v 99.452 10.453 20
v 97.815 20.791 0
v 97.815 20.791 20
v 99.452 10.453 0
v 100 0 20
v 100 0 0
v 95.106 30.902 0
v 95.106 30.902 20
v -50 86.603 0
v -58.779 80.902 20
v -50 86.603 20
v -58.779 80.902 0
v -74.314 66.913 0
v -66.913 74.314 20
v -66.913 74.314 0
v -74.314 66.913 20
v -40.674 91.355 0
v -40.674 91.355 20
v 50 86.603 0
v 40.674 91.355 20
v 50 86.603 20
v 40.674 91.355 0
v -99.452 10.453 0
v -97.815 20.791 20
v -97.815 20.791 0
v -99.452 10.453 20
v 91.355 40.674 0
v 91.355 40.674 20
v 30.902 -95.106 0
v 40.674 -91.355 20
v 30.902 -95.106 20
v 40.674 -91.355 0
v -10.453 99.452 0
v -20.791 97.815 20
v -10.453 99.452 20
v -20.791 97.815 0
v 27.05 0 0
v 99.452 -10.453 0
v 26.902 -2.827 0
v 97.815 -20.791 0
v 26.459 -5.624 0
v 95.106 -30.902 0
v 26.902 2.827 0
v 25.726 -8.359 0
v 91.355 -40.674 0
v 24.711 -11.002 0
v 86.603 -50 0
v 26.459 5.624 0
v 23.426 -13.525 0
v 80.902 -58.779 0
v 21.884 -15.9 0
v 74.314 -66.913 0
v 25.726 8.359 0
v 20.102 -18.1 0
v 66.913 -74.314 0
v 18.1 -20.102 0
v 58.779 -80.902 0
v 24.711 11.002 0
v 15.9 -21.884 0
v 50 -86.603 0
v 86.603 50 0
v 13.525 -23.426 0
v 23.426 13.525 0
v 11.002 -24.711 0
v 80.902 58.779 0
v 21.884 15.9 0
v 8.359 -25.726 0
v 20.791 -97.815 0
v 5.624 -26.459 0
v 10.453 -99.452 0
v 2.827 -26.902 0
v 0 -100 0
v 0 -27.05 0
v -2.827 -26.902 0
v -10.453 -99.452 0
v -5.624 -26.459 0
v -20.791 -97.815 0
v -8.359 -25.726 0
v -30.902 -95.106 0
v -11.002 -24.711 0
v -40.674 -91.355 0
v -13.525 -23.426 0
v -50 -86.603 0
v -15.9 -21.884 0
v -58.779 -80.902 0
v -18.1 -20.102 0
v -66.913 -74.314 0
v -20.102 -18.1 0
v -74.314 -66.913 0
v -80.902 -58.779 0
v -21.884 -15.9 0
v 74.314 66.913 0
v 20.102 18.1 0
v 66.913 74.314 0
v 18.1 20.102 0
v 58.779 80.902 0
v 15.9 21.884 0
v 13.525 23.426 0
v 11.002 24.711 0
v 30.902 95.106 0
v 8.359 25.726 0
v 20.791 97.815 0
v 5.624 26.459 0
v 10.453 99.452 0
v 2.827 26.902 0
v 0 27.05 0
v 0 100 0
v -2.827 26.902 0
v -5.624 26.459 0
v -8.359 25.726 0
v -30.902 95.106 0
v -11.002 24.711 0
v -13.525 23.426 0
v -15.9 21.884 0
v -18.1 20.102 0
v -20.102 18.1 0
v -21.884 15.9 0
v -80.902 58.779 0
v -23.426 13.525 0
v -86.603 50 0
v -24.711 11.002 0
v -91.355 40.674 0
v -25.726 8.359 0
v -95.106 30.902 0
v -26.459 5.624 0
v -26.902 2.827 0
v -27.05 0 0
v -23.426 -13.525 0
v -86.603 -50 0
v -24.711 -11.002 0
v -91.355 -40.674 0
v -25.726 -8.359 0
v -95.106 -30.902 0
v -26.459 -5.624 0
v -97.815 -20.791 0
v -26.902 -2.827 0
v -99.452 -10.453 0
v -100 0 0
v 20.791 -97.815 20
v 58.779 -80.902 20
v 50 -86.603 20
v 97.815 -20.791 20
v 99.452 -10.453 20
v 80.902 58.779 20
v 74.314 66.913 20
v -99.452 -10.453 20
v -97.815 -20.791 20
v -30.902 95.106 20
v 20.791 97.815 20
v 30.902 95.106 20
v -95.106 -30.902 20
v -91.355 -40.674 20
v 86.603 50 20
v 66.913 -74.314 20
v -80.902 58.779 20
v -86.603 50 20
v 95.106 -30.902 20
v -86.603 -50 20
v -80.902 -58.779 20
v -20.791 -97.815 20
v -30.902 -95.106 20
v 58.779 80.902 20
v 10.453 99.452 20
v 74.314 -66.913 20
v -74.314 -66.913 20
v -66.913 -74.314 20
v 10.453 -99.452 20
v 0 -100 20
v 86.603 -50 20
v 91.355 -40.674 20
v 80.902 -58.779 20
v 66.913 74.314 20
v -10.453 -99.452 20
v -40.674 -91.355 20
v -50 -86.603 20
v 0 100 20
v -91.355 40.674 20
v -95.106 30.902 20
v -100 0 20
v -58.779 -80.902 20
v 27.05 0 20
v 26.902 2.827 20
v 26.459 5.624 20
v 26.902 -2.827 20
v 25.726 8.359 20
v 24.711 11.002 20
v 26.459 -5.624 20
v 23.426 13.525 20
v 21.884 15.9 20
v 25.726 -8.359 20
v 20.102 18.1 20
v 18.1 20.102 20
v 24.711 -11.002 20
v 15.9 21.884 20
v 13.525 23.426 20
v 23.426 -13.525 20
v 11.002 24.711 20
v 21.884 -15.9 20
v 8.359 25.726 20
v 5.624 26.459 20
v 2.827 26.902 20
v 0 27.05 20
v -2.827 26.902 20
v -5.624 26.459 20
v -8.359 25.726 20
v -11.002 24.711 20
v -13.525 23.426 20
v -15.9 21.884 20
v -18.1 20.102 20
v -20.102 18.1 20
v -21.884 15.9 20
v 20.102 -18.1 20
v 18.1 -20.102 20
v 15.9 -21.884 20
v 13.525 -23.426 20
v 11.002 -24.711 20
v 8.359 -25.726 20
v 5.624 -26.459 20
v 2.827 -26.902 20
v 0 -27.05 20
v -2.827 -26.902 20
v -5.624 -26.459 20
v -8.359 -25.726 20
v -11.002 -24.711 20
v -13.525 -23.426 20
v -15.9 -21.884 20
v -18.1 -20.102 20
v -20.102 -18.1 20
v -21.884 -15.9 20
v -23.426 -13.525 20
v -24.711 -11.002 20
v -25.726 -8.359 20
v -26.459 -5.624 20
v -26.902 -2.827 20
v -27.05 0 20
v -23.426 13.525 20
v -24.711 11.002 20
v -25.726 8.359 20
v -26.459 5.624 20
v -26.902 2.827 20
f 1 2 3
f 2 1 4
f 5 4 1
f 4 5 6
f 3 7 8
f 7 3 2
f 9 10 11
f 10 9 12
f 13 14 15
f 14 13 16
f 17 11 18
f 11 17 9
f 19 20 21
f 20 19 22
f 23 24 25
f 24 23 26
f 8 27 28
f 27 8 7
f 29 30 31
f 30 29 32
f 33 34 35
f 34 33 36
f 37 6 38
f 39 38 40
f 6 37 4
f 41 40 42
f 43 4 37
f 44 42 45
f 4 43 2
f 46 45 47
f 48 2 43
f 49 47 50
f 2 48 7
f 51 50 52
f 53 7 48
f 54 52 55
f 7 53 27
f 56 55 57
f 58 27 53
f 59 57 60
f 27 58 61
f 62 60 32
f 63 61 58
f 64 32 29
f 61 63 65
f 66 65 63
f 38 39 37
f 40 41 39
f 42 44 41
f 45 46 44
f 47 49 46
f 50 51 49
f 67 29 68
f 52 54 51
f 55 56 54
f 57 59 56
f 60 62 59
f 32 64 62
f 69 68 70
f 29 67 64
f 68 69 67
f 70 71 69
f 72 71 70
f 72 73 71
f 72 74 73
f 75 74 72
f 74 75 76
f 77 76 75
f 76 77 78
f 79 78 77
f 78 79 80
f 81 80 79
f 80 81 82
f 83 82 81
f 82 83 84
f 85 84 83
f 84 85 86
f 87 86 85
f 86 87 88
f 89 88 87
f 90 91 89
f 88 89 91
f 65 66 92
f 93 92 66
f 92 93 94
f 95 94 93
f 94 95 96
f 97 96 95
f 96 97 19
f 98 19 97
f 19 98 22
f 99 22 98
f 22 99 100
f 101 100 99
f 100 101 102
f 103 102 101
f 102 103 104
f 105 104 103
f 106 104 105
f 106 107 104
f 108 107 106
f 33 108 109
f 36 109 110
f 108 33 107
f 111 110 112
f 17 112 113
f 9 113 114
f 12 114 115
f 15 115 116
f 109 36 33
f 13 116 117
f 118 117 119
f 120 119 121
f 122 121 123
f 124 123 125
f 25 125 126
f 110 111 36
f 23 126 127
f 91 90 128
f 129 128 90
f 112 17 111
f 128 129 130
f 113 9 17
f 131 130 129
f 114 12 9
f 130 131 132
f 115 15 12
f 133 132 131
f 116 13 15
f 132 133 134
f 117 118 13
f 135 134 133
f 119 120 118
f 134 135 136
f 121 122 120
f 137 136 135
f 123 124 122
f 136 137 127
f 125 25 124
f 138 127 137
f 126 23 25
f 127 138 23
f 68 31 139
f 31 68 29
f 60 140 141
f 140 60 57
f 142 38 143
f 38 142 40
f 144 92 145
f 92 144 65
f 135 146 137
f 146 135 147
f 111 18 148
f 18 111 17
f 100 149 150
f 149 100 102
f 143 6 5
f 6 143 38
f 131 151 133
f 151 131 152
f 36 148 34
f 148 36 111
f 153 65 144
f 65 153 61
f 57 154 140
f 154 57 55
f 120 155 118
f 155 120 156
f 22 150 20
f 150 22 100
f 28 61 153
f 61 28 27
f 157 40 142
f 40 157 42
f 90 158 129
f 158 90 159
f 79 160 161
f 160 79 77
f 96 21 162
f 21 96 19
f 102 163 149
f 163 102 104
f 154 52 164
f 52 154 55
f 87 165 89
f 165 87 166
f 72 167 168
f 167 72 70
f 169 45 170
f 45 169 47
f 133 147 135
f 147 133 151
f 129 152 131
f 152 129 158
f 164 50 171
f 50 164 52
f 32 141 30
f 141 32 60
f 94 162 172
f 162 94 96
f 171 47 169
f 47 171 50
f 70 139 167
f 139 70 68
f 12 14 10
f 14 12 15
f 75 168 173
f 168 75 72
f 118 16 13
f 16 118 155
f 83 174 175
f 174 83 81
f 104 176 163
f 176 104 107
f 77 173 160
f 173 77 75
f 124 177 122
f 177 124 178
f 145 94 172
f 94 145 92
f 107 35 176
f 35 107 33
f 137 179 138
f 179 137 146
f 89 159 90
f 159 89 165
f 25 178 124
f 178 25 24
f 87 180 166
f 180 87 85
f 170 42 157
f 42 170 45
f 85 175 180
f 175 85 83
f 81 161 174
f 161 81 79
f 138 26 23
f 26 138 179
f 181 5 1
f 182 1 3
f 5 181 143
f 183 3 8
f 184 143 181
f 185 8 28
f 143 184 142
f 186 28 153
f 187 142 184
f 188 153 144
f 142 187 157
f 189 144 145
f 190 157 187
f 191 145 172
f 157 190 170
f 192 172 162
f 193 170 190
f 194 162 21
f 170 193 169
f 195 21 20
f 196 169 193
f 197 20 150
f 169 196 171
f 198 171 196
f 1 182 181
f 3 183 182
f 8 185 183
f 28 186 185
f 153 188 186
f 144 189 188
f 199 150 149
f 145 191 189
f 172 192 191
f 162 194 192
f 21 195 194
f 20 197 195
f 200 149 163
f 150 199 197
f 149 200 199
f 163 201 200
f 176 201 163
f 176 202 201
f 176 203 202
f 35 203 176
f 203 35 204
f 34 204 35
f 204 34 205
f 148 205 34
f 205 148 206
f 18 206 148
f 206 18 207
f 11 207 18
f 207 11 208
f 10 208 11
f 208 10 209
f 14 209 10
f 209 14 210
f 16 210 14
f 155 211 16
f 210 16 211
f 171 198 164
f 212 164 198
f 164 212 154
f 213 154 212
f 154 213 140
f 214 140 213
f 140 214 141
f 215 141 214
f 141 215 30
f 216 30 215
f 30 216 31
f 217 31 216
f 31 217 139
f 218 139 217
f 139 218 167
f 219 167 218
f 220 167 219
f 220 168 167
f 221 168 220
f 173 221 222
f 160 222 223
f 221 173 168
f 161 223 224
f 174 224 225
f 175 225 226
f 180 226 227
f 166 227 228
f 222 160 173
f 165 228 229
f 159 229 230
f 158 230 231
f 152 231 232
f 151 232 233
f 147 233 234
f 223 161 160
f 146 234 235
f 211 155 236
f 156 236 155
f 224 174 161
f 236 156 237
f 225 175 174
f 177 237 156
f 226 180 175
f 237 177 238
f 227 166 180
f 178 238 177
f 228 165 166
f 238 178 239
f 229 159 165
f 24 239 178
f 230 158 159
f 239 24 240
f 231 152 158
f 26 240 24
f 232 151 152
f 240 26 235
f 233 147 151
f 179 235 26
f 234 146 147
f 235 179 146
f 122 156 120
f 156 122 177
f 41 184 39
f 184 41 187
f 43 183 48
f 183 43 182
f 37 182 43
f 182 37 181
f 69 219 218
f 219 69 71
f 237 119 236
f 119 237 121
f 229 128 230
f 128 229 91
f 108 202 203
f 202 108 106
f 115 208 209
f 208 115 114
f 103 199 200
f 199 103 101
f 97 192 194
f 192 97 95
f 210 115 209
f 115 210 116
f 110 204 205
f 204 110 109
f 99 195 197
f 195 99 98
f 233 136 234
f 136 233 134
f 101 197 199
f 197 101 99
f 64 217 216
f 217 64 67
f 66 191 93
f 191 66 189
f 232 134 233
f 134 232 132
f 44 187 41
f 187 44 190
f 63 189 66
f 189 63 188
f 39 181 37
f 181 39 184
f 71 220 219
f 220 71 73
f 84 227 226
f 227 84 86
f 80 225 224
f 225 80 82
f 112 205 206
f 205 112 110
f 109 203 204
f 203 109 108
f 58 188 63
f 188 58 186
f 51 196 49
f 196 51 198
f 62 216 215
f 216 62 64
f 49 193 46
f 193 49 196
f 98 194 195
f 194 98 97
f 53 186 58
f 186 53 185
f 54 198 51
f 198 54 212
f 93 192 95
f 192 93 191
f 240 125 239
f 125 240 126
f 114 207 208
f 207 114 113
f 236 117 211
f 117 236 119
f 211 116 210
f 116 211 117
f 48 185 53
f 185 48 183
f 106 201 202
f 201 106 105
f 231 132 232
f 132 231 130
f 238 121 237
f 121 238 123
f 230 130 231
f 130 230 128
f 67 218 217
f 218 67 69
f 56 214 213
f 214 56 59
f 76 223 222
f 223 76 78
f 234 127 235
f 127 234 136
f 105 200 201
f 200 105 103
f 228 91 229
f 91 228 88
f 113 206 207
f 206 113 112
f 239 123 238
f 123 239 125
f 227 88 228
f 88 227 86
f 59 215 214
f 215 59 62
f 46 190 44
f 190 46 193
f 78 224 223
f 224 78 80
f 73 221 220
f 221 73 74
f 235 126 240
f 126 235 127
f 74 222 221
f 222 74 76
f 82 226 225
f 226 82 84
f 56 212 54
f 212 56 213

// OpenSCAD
raft_diameter = 200;
raft_height = 20;
wall_thickness = 1.6;

thickness_walls = 0.8;

tolerance_offset = 0.1;

overhang_extent=4*thickness_walls+tolerance_offset;
overhang_angle = 45;
overhang_height=1;

wicking_chamber_diameter = 50.8;
hole_cutout_diameter = wicking_chamber_diameter + overhang_extent;

// Hidden variables:
$fn=60;

module donut() {
    difference() {
        cylinder(r=raft_diameter/2, h=raft_height);
        cylinder(r=hole_cutout_diameter/2, h=raft_height);
    }
}

donut();
